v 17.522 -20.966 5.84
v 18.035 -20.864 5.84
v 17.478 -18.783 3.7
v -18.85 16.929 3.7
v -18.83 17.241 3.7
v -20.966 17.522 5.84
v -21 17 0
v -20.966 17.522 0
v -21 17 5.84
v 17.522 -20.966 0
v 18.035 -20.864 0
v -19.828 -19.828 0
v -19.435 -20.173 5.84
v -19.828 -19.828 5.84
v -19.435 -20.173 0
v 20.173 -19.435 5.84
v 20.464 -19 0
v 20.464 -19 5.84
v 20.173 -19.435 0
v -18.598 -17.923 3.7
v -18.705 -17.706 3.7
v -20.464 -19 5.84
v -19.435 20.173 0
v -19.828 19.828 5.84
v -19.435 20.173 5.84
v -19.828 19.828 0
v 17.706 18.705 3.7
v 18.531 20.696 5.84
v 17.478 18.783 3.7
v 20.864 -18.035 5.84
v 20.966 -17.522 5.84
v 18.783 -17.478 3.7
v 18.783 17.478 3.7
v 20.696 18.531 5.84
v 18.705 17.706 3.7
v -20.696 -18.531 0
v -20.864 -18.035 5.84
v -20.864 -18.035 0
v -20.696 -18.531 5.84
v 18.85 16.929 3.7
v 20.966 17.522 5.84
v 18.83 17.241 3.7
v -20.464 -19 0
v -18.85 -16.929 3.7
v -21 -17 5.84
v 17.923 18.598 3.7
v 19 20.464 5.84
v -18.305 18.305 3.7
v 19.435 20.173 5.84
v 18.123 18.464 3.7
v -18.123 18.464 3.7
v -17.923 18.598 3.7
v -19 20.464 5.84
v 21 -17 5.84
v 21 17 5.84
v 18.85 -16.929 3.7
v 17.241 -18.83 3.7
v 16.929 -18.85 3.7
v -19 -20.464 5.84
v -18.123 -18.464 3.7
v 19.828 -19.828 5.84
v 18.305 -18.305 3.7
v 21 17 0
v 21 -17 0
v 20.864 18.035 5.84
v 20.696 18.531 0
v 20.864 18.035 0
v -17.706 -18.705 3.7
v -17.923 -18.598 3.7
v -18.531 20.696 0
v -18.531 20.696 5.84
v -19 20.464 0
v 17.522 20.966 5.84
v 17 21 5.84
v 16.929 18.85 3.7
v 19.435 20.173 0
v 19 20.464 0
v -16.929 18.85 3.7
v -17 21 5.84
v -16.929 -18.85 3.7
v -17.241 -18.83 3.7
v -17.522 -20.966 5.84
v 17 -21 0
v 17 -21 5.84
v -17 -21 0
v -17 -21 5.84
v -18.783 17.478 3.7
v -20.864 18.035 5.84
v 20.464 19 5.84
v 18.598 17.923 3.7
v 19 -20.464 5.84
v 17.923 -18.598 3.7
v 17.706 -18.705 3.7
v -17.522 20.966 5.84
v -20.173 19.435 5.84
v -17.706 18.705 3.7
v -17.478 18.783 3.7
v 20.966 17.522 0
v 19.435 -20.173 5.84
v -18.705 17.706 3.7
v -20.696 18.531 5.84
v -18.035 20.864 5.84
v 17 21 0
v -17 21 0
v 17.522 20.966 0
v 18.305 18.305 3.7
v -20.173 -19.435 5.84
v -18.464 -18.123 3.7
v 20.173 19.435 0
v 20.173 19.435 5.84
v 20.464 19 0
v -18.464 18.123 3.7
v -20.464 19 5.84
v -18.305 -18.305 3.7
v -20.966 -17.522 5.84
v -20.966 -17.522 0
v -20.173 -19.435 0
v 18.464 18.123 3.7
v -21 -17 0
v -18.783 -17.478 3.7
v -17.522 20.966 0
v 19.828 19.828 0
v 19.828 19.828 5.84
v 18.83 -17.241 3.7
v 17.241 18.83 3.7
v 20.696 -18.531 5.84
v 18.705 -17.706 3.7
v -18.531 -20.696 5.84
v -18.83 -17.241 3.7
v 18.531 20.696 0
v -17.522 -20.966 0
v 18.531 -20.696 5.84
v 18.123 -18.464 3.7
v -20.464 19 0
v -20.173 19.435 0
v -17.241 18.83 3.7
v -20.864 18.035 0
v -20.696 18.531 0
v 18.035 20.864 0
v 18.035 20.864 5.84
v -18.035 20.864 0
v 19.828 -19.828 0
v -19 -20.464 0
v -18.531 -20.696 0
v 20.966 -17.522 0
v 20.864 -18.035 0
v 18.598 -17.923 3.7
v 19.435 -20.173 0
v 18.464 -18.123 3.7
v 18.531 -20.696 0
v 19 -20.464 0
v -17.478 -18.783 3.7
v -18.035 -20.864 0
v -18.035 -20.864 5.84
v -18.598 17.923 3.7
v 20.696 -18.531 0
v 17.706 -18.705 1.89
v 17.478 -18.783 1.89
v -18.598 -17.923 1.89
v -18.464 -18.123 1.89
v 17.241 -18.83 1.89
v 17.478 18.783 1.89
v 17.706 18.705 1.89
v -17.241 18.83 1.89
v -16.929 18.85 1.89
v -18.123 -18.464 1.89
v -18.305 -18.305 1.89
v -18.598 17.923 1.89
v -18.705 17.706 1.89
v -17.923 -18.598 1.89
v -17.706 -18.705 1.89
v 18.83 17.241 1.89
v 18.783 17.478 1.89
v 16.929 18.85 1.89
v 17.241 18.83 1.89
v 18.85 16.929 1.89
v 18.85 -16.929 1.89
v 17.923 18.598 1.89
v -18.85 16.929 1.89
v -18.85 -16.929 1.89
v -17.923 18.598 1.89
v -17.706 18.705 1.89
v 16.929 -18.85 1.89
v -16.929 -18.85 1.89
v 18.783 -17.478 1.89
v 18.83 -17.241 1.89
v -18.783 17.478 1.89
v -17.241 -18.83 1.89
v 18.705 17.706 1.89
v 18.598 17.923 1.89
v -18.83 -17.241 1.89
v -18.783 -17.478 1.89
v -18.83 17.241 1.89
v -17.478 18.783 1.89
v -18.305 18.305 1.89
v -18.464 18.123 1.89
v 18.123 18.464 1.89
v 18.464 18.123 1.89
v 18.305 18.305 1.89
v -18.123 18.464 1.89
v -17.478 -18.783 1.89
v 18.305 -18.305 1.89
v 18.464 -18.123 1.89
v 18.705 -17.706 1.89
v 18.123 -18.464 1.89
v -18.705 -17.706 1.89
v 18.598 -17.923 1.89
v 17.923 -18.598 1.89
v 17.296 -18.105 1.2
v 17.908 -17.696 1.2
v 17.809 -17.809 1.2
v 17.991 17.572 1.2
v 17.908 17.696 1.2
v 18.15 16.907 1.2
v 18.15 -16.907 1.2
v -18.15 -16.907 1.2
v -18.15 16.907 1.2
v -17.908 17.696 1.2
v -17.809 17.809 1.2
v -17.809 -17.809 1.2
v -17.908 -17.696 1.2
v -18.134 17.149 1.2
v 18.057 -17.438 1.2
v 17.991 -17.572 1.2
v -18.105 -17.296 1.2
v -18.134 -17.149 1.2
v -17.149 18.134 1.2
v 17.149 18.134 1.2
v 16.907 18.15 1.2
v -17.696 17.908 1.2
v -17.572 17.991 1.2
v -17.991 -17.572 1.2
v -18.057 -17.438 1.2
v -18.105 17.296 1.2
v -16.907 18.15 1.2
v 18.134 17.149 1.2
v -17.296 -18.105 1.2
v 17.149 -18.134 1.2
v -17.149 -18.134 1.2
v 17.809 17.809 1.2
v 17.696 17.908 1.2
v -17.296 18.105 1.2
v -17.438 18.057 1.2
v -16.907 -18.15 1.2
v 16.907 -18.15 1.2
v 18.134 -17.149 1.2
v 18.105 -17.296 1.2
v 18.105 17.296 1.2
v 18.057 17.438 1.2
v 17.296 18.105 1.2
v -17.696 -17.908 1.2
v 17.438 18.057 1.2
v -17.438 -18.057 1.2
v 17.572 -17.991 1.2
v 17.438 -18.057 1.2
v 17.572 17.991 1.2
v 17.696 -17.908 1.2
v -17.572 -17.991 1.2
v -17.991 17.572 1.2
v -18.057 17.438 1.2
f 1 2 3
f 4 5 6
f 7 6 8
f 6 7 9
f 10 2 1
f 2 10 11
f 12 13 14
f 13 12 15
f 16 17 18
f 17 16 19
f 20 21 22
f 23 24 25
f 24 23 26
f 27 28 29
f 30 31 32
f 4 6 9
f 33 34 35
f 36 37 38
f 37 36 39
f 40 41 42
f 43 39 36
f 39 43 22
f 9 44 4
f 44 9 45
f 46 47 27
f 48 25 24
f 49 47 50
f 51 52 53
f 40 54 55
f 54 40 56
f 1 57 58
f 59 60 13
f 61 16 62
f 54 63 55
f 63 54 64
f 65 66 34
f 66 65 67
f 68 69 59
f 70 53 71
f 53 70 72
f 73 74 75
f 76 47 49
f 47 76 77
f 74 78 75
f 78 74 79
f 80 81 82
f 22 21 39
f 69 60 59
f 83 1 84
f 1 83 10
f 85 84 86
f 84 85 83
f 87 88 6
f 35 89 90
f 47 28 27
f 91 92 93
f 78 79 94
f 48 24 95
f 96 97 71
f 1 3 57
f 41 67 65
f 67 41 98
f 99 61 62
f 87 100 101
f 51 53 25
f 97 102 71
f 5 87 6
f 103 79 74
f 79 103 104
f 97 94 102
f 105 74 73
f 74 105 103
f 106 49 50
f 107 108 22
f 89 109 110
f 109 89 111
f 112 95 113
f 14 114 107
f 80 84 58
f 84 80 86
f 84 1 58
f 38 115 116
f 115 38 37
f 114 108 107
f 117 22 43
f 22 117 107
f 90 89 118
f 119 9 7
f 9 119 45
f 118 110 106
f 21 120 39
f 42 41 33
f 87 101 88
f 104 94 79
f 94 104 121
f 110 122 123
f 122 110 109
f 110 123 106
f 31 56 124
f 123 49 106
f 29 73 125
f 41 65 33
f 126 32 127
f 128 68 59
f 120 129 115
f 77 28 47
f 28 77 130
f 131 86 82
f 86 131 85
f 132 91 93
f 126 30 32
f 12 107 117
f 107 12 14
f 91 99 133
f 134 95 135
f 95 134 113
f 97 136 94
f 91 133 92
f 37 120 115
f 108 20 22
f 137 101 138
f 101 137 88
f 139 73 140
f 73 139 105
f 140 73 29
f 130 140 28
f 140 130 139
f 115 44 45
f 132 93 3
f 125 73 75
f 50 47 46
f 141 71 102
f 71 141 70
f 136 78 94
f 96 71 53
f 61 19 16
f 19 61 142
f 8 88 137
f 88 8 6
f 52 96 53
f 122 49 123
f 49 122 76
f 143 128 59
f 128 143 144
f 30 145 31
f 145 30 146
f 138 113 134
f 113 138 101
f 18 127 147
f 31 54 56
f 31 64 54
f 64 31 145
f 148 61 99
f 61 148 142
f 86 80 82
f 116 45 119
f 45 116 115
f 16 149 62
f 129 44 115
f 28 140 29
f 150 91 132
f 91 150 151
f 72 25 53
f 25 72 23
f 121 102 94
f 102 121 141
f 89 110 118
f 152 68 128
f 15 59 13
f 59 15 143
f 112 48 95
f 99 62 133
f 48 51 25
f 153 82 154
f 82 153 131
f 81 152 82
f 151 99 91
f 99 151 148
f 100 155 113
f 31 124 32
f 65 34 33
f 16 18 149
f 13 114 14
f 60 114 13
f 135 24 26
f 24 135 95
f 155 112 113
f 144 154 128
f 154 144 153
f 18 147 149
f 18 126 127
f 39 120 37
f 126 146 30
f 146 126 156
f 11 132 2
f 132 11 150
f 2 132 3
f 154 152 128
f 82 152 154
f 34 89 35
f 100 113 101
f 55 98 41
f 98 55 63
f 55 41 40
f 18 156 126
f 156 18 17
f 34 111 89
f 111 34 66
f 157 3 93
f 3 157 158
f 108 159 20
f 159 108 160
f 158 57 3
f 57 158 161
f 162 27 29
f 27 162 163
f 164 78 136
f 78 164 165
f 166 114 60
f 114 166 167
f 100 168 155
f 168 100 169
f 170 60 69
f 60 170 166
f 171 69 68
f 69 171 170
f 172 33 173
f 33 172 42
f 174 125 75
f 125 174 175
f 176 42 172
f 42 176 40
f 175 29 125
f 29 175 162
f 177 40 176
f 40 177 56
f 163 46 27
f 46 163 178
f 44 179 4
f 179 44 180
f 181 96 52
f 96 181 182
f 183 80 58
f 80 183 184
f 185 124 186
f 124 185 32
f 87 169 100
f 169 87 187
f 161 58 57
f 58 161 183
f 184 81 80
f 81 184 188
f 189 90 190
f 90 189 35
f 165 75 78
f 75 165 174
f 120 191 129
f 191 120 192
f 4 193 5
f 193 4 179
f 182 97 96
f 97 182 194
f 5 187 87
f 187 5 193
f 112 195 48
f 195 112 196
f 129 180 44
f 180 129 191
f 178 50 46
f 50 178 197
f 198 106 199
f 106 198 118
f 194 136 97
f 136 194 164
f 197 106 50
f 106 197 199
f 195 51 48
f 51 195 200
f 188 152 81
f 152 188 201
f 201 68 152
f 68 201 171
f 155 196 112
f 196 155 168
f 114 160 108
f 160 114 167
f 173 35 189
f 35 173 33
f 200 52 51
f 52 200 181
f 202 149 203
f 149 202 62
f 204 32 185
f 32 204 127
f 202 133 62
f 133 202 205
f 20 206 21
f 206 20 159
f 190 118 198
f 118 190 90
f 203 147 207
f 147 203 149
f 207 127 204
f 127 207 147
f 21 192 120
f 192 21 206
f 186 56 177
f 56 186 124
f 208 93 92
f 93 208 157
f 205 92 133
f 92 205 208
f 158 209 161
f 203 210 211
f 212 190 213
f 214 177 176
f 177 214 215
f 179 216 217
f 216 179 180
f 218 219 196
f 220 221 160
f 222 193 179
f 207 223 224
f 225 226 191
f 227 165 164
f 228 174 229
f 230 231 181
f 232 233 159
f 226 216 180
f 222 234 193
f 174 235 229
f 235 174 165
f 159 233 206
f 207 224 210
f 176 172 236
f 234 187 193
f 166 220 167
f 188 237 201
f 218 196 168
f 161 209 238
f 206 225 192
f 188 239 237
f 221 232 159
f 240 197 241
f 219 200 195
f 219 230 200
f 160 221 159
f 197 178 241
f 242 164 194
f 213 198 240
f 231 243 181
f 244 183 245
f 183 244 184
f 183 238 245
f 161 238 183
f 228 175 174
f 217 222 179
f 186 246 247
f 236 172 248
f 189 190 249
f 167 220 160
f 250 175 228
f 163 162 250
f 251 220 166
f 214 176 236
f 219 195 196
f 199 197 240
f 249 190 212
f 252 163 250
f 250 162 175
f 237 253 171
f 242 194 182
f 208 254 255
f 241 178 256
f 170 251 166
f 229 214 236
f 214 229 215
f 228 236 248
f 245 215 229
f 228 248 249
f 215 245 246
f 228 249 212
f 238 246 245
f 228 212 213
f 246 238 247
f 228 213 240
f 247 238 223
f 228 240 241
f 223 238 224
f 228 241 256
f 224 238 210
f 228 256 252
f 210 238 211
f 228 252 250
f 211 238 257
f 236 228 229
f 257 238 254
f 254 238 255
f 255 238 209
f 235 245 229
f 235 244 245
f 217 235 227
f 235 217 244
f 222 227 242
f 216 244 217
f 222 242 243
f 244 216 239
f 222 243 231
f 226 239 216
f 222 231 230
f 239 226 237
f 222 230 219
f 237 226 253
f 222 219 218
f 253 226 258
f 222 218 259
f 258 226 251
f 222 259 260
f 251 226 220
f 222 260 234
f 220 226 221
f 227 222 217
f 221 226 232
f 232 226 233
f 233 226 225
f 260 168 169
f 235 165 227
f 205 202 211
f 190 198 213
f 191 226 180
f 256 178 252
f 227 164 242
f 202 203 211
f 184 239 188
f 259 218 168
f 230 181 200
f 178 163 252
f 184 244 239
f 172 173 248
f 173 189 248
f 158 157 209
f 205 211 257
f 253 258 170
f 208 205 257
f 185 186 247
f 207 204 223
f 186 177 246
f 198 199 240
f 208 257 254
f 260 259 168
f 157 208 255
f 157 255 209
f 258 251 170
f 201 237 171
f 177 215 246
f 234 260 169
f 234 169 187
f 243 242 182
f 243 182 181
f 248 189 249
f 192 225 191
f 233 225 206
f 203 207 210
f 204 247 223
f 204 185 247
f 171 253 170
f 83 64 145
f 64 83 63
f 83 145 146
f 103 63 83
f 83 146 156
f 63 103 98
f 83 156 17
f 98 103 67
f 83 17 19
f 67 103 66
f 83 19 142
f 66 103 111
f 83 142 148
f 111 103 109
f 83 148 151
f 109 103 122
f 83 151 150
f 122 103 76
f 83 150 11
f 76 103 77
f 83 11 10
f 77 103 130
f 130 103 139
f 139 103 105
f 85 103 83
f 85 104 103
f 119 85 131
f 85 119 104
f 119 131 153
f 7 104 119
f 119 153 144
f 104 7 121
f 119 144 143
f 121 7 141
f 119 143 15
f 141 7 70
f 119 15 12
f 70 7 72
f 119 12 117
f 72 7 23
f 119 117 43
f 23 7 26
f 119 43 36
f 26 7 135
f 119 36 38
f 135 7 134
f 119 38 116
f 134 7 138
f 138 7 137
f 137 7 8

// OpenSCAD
// file: lib/gridfinity.scad
// gridfinity.scad — shared Gridfinity baseplate + bin library (per spec).
//
// SPDX-License-Identifier: MIT
// Copyright (c) 2026 Aaron Cupp
//
// Original work, written from the published Gridfinity dimensional spec — no
// code derives from any other Gridfinity implementation. Previously published
// under CC BY-NC 4.0 in IamMrCupp/3d-printer-models; relicensed MIT here by the
// copyright holder.
//
// 42 mm pitch, 41.5 mm bins, baseplate socket 0.7/1.8/2.15 = 4.65 mm, 4 mm
// fillet; bin foot 0.8/1.8/2.15 = 4.75 mm, 3.75 mm corner radius. Verified the
// bin foot seats in the baseplate socket with ~0.25–0.5 mm clearance.
//
//   baseplate(nx, ny)                      — tiled receiving baseplate
//   bin(nx, ny, h, wall, floor)            — open Gridfinity bin
//   divided_bin(nx, ny, h, cols, rows, …)  — bin with internal compartments

GF = 42; GF_FILLET = 4;
_C_TOP = 2.15; _C_MID = 1.8; _C_BOT = 0.7;
_BP_LIP = _C_TOP + _C_MID + _C_BOT; _BP_FLOOR = 1.2; BP_H = _BP_LIP + _BP_FLOOR;  // 5.85
BIN_SZ = 41.5; BIN_R = 3.75; BIN_BASE_H = 4.75;

// ---- baseplate ----
module _bp_cell(i = 0) { offset(r = -i) offset(r = GF_FILLET) offset(r = -GF_FILLET) square(GF, center = true); }
module _bp_socket() {
    e = 0.01;
    hull() { translate([0,0,BP_H-e]) linear_extrude(e) _bp_cell(0); translate([0,0,BP_H-_C_TOP]) linear_extrude(e) _bp_cell(_C_TOP); }
    translate([0,0,BP_H-_C_TOP-_C_MID]) linear_extrude(_C_MID) _bp_cell(_C_TOP);
    hull() { translate([0,0,BP_H-_C_TOP-_C_MID-e]) linear_extrude(e) _bp_cell(_C_TOP); translate([0,0,BP_H-_BP_LIP]) linear_extrude(e) _bp_cell(_C_TOP+_C_BOT); }
}
module baseplate(nx, ny) {
    w = nx*GF; d = ny*GF;
    difference() {
        translate([0,0,BP_H/2]) linear_extrude(BP_H, center=true) offset(GF_FILLET) offset(-GF_FILLET) square([w,d], center=true);
        for (ix=[0:nx-1], iy=[0:ny-1]) translate([(ix-(nx-1)/2)*GF, (iy-(ny-1)/2)*GF, 0]) _bp_socket();
    }
}

// ---- bin ----
module _bin_cell(i = 0) { offset(r = -i) offset(r = BIN_R) offset(r = -BIN_R) square(BIN_SZ, center = true); }
module _bin_foot() {
    e = 0.01;
    hull() { linear_extrude(e) _bin_cell(2.95); translate([0,0,0.8]) linear_extrude(e) _bin_cell(2.15); }    // bottom chamfer
    translate([0,0,0.8]) linear_extrude(1.8) _bin_cell(2.15);                                                 // vertical
    hull() { translate([0,0,2.6]) linear_extrude(e) _bin_cell(2.15); translate([0,0,BIN_BASE_H]) linear_extrude(e) _bin_cell(0); } // top chamfer
}
module _bin_shell(nx, ny, h, wall, floor) {
    W = nx*GF - 0.5; D = ny*GF - 0.5;
    difference() {
        union() {
            for (ix=[0:nx-1], iy=[0:ny-1]) translate([(ix-(nx-1)/2)*GF, (iy-(ny-1)/2)*GF, 0]) _bin_foot();
            translate([0,0,BIN_BASE_H]) linear_extrude(h-BIN_BASE_H) offset(BIN_R) offset(-BIN_R) square([W,D], center=true);
        }
        translate([0,0,BIN_BASE_H+floor]) linear_extrude(h) offset(BIN_R-wall) offset(-(BIN_R-wall)) square([W-2*wall, D-2*wall], center=true);
    }
}
module bin(nx, ny, h, wall = 1.2, floor = 1.4) { _bin_shell(nx, ny, h, wall, floor); }

module divided_bin(nx, ny, h, cols = 1, rows = 1, wall = 1.2, floor = 1.4, div = 1.2) {
    W = nx*GF - 0.5; D = ny*GF - 0.5;
    union() {
        bin(nx, ny, h, wall, floor);
        // internal divider walls (from the floor up to the rim)
        iw = W - 2*wall; id = D - 2*wall; z0 = BIN_BASE_H + floor;
        for (c = [1 : cols-1]) translate([-iw/2 + c*iw/cols - div/2, -id/2, z0]) cube([div, id, h - z0]);
        for (r = [1 : rows-1]) translate([-iw/2, -id/2 + r*id/rows - div/2, z0]) cube([iw, div, h - z0]);
    }
}
// file: lib/clickfinity.scad
// clickfinity.scad — magnet-free Gridfinity baseplate with flexible latch arms.
//
// SPDX-License-Identifier: MIT
// Copyright (c) 2026 Aaron Cupp
//
// Clean-room reimplementation of the Clickfinity *concept* (jerrymk →
// NoWarrenty → John Hall's CLICKbase) from the published Gridfinity spec and
// physical measurement. No geometry is ported from the upstream Fusion 360
// sources.
//
//   clickfinity_baseplate(nx, ny)  — tiled baseplate with latch arms
//   click_arm()                    — one cantilever latch  (Phase 2 — TODO)
//   connector_clip()               — plate-to-plate joiner (Phase 4 — TODO)
//
// PRINT IN PETG / ABS / ASA / NYLON — **NOT PLA.** The arms sit under constant
// spring tension; PLA creeps and loses grip within weeks.

// `include`, not `use` — we need gridfinity.scad's spec constants (GF, BIN_SZ,
// _C_TOP, _BP_FLOOR), and `use` imports only modules/functions. It carries no
// top-level geometry, so including it is side-effect free.
include <gridfinity.scad>

// ---------------------------------------------------------------------------
// Where the latch grabs — the one place it can
// ---------------------------------------------------------------------------
//
// A Gridfinity bin's foot is a stack of three bands, widening as it rises
// (all insets measured from the 41.5 mm foot square, per lib/gridfinity.scad):
//
//   foot z 0.00 → 0.80   bottom chamfer, inset 2.95 → 2.15   (lead-in)
//   foot z 0.80 → 2.60   vertical wall,  inset 2.15          (the cam surface)
//   foot z 2.60 → 4.75   top chamfer,    inset 2.15 → 0      (the catch)
//
// Every overhang on that foot faces *downward*. So there is exactly one
// re-entrant feature a latch can hook: the **underside of the top chamfer**.
// Pull the bin up and that surface presses down on the arm tip. That is the
// click. There is no second option — the foot offers nothing else to grab.
//
// The bin foot bottoms out on the baseplate floor (BP_FLOOR = 1.2), so in
// plate coordinates (z = 0 at the plate's underside):

FOOT_SEAT_Z  = _BP_FLOOR;                    // 1.20 — foot's bottom face
FOOT_VERT_Z0 = FOOT_SEAT_Z + 0.8;            // 2.00 — cam surface starts
FOOT_VERT_Z1 = FOOT_SEAT_Z + 2.6;            // 3.80 — catch edge: arm tip goes here
FOOT_VERT_HW = BIN_SZ / 2 - _C_TOP;          // 18.60 — foot half-width at the cam
SOCKET_HW    = GF / 2 - _C_TOP;              // 18.85 — socket half-width, same height
//
// The 0.25 mm gap between those two is the stock clearance. An arm tip must
// reach *past* the foot wall to hook the chamfer above it — so the tip's inner
// face lands at FOOT_VERT_HW - ARM_ENGAGE, and the arm deflects by ARM_ENGAGE
// as the foot's lead-in chamfer cams it outward on the way in.

// ---------------------------------------------------------------------------
// Tunables — the click lives or dies here. Tune against a printed 1x1_test.
// ---------------------------------------------------------------------------

ARM_ENGAGE    = 0.60;  // [0.35:0.05:1.00] mm the tip overlaps the foot wall.
                       //   Too low  → bin lifts out / falls out.
                       //   Too high → won't seat, or the arm snaps.
                       //   ALSO equals the arm's deflection during insertion.
ARM_THICKNESS = 1.20;  // [0.80:0.05:2.00] mm cantilever thickness. Stiffness
                       //   goes as thickness^3 — this is the coarse knob.
                       //   Keep it a clean multiple of your nozzle width.
ARM_LENGTH    = 9.00;  // [6.00:0.50:14.00] mm free length. Stiffness goes as
                       //   1/length^3 — the fine knob. Longer = softer.
ARM_WIDTH     = 6.00;  // [4.00:0.50:10.00] mm along the cell wall.
CLEARANCE     = 0.00;  // [-0.20:0.01:0.20] mm global horizontal compensation.
                       //   Positive = looser. Your printer's elephant-foot and
                       //   flow tuning land here. ±0.10–0.15 is the usual range.

ARMS_PER_CELL = 4;     // [2, 4] one per side. 2 = opposing pair (softer insert).

// ---------------------------------------------------------------------------
// Geometry
// ---------------------------------------------------------------------------

// One cantilever latch, positioned at the +Y wall of a cell, tip pointing -Y.
// Phase 2 — TODO. The arm must:
//   1. live in a relief pocket cut through the socket wall (so it can flex out)
//   2. present a lead-in ramp below FOOT_VERT_Z0 for the foot to cam against
//   3. present a flat (or slightly back-angled) catch face at FOOT_VERT_Z1
//   4. flex across layer lines, not along them — see README print orientation
module click_arm() {
    // intentionally empty until Phase 2
}

// Relief pocket the arm flexes into. Cut from the plate before the arm is added.
// Phase 2 — TODO.
module _arm_relief() {
    // intentionally empty until Phase 2
}

// A full baseplate: standard Gridfinity sockets, plus a latch on each cell wall.
module clickfinity_baseplate(nx, ny, arms = true) {
    difference() {
        baseplate(nx, ny);
        if (arms)
            for (ix = [0:nx-1], iy = [0:ny-1])
                translate([(ix-(nx-1)/2)*GF, (iy-(ny-1)/2)*GF, 0])
                    for (a = [0:ARMS_PER_CELL-1]) rotate([0,0,a*360/ARMS_PER_CELL]) _arm_relief();
    }
    if (arms)
        for (ix = [0:nx-1], iy = [0:ny-1])
            translate([(ix-(nx-1)/2)*GF, (iy-(ny-1)/2)*GF, 0])
                for (a = [0:ARMS_PER_CELL-1]) rotate([0,0,a*360/ARMS_PER_CELL]) click_arm();
}

// Plate-to-plate joiner — Phase 4 TODO. CLICKbase uses separate printed clips;
// dovetails are the alternative. Decide once flush edges are settled.
module connector_clip() {
    // intentionally empty until Phase 4
}
// main file
// 1x1_test.scad — the tuning unit. Print THIS, not a full plate.
//
// SPDX-License-Identifier: MIT
// Copyright (c) 2026 Aaron Cupp
//
// A single 42×42 mm cell. Prints in a couple of minutes, so a tuning pass costs
// minutes instead of hours. Change one parameter at a time, print, click a real
// Gridfinity bin into it, record the result in SESSION-LOG.md.
//
// Tuning protocol — see README.md § Tuning.

include <lib/clickfinity.scad>

/* [Latch arms] */
ENABLE_ARMS = false;  // Phase 2 — no arm geometry yet.

/* [Quality] */
$fn = 48;

clickfinity_baseplate(1, 1, arms = ENABLE_ARMS);
